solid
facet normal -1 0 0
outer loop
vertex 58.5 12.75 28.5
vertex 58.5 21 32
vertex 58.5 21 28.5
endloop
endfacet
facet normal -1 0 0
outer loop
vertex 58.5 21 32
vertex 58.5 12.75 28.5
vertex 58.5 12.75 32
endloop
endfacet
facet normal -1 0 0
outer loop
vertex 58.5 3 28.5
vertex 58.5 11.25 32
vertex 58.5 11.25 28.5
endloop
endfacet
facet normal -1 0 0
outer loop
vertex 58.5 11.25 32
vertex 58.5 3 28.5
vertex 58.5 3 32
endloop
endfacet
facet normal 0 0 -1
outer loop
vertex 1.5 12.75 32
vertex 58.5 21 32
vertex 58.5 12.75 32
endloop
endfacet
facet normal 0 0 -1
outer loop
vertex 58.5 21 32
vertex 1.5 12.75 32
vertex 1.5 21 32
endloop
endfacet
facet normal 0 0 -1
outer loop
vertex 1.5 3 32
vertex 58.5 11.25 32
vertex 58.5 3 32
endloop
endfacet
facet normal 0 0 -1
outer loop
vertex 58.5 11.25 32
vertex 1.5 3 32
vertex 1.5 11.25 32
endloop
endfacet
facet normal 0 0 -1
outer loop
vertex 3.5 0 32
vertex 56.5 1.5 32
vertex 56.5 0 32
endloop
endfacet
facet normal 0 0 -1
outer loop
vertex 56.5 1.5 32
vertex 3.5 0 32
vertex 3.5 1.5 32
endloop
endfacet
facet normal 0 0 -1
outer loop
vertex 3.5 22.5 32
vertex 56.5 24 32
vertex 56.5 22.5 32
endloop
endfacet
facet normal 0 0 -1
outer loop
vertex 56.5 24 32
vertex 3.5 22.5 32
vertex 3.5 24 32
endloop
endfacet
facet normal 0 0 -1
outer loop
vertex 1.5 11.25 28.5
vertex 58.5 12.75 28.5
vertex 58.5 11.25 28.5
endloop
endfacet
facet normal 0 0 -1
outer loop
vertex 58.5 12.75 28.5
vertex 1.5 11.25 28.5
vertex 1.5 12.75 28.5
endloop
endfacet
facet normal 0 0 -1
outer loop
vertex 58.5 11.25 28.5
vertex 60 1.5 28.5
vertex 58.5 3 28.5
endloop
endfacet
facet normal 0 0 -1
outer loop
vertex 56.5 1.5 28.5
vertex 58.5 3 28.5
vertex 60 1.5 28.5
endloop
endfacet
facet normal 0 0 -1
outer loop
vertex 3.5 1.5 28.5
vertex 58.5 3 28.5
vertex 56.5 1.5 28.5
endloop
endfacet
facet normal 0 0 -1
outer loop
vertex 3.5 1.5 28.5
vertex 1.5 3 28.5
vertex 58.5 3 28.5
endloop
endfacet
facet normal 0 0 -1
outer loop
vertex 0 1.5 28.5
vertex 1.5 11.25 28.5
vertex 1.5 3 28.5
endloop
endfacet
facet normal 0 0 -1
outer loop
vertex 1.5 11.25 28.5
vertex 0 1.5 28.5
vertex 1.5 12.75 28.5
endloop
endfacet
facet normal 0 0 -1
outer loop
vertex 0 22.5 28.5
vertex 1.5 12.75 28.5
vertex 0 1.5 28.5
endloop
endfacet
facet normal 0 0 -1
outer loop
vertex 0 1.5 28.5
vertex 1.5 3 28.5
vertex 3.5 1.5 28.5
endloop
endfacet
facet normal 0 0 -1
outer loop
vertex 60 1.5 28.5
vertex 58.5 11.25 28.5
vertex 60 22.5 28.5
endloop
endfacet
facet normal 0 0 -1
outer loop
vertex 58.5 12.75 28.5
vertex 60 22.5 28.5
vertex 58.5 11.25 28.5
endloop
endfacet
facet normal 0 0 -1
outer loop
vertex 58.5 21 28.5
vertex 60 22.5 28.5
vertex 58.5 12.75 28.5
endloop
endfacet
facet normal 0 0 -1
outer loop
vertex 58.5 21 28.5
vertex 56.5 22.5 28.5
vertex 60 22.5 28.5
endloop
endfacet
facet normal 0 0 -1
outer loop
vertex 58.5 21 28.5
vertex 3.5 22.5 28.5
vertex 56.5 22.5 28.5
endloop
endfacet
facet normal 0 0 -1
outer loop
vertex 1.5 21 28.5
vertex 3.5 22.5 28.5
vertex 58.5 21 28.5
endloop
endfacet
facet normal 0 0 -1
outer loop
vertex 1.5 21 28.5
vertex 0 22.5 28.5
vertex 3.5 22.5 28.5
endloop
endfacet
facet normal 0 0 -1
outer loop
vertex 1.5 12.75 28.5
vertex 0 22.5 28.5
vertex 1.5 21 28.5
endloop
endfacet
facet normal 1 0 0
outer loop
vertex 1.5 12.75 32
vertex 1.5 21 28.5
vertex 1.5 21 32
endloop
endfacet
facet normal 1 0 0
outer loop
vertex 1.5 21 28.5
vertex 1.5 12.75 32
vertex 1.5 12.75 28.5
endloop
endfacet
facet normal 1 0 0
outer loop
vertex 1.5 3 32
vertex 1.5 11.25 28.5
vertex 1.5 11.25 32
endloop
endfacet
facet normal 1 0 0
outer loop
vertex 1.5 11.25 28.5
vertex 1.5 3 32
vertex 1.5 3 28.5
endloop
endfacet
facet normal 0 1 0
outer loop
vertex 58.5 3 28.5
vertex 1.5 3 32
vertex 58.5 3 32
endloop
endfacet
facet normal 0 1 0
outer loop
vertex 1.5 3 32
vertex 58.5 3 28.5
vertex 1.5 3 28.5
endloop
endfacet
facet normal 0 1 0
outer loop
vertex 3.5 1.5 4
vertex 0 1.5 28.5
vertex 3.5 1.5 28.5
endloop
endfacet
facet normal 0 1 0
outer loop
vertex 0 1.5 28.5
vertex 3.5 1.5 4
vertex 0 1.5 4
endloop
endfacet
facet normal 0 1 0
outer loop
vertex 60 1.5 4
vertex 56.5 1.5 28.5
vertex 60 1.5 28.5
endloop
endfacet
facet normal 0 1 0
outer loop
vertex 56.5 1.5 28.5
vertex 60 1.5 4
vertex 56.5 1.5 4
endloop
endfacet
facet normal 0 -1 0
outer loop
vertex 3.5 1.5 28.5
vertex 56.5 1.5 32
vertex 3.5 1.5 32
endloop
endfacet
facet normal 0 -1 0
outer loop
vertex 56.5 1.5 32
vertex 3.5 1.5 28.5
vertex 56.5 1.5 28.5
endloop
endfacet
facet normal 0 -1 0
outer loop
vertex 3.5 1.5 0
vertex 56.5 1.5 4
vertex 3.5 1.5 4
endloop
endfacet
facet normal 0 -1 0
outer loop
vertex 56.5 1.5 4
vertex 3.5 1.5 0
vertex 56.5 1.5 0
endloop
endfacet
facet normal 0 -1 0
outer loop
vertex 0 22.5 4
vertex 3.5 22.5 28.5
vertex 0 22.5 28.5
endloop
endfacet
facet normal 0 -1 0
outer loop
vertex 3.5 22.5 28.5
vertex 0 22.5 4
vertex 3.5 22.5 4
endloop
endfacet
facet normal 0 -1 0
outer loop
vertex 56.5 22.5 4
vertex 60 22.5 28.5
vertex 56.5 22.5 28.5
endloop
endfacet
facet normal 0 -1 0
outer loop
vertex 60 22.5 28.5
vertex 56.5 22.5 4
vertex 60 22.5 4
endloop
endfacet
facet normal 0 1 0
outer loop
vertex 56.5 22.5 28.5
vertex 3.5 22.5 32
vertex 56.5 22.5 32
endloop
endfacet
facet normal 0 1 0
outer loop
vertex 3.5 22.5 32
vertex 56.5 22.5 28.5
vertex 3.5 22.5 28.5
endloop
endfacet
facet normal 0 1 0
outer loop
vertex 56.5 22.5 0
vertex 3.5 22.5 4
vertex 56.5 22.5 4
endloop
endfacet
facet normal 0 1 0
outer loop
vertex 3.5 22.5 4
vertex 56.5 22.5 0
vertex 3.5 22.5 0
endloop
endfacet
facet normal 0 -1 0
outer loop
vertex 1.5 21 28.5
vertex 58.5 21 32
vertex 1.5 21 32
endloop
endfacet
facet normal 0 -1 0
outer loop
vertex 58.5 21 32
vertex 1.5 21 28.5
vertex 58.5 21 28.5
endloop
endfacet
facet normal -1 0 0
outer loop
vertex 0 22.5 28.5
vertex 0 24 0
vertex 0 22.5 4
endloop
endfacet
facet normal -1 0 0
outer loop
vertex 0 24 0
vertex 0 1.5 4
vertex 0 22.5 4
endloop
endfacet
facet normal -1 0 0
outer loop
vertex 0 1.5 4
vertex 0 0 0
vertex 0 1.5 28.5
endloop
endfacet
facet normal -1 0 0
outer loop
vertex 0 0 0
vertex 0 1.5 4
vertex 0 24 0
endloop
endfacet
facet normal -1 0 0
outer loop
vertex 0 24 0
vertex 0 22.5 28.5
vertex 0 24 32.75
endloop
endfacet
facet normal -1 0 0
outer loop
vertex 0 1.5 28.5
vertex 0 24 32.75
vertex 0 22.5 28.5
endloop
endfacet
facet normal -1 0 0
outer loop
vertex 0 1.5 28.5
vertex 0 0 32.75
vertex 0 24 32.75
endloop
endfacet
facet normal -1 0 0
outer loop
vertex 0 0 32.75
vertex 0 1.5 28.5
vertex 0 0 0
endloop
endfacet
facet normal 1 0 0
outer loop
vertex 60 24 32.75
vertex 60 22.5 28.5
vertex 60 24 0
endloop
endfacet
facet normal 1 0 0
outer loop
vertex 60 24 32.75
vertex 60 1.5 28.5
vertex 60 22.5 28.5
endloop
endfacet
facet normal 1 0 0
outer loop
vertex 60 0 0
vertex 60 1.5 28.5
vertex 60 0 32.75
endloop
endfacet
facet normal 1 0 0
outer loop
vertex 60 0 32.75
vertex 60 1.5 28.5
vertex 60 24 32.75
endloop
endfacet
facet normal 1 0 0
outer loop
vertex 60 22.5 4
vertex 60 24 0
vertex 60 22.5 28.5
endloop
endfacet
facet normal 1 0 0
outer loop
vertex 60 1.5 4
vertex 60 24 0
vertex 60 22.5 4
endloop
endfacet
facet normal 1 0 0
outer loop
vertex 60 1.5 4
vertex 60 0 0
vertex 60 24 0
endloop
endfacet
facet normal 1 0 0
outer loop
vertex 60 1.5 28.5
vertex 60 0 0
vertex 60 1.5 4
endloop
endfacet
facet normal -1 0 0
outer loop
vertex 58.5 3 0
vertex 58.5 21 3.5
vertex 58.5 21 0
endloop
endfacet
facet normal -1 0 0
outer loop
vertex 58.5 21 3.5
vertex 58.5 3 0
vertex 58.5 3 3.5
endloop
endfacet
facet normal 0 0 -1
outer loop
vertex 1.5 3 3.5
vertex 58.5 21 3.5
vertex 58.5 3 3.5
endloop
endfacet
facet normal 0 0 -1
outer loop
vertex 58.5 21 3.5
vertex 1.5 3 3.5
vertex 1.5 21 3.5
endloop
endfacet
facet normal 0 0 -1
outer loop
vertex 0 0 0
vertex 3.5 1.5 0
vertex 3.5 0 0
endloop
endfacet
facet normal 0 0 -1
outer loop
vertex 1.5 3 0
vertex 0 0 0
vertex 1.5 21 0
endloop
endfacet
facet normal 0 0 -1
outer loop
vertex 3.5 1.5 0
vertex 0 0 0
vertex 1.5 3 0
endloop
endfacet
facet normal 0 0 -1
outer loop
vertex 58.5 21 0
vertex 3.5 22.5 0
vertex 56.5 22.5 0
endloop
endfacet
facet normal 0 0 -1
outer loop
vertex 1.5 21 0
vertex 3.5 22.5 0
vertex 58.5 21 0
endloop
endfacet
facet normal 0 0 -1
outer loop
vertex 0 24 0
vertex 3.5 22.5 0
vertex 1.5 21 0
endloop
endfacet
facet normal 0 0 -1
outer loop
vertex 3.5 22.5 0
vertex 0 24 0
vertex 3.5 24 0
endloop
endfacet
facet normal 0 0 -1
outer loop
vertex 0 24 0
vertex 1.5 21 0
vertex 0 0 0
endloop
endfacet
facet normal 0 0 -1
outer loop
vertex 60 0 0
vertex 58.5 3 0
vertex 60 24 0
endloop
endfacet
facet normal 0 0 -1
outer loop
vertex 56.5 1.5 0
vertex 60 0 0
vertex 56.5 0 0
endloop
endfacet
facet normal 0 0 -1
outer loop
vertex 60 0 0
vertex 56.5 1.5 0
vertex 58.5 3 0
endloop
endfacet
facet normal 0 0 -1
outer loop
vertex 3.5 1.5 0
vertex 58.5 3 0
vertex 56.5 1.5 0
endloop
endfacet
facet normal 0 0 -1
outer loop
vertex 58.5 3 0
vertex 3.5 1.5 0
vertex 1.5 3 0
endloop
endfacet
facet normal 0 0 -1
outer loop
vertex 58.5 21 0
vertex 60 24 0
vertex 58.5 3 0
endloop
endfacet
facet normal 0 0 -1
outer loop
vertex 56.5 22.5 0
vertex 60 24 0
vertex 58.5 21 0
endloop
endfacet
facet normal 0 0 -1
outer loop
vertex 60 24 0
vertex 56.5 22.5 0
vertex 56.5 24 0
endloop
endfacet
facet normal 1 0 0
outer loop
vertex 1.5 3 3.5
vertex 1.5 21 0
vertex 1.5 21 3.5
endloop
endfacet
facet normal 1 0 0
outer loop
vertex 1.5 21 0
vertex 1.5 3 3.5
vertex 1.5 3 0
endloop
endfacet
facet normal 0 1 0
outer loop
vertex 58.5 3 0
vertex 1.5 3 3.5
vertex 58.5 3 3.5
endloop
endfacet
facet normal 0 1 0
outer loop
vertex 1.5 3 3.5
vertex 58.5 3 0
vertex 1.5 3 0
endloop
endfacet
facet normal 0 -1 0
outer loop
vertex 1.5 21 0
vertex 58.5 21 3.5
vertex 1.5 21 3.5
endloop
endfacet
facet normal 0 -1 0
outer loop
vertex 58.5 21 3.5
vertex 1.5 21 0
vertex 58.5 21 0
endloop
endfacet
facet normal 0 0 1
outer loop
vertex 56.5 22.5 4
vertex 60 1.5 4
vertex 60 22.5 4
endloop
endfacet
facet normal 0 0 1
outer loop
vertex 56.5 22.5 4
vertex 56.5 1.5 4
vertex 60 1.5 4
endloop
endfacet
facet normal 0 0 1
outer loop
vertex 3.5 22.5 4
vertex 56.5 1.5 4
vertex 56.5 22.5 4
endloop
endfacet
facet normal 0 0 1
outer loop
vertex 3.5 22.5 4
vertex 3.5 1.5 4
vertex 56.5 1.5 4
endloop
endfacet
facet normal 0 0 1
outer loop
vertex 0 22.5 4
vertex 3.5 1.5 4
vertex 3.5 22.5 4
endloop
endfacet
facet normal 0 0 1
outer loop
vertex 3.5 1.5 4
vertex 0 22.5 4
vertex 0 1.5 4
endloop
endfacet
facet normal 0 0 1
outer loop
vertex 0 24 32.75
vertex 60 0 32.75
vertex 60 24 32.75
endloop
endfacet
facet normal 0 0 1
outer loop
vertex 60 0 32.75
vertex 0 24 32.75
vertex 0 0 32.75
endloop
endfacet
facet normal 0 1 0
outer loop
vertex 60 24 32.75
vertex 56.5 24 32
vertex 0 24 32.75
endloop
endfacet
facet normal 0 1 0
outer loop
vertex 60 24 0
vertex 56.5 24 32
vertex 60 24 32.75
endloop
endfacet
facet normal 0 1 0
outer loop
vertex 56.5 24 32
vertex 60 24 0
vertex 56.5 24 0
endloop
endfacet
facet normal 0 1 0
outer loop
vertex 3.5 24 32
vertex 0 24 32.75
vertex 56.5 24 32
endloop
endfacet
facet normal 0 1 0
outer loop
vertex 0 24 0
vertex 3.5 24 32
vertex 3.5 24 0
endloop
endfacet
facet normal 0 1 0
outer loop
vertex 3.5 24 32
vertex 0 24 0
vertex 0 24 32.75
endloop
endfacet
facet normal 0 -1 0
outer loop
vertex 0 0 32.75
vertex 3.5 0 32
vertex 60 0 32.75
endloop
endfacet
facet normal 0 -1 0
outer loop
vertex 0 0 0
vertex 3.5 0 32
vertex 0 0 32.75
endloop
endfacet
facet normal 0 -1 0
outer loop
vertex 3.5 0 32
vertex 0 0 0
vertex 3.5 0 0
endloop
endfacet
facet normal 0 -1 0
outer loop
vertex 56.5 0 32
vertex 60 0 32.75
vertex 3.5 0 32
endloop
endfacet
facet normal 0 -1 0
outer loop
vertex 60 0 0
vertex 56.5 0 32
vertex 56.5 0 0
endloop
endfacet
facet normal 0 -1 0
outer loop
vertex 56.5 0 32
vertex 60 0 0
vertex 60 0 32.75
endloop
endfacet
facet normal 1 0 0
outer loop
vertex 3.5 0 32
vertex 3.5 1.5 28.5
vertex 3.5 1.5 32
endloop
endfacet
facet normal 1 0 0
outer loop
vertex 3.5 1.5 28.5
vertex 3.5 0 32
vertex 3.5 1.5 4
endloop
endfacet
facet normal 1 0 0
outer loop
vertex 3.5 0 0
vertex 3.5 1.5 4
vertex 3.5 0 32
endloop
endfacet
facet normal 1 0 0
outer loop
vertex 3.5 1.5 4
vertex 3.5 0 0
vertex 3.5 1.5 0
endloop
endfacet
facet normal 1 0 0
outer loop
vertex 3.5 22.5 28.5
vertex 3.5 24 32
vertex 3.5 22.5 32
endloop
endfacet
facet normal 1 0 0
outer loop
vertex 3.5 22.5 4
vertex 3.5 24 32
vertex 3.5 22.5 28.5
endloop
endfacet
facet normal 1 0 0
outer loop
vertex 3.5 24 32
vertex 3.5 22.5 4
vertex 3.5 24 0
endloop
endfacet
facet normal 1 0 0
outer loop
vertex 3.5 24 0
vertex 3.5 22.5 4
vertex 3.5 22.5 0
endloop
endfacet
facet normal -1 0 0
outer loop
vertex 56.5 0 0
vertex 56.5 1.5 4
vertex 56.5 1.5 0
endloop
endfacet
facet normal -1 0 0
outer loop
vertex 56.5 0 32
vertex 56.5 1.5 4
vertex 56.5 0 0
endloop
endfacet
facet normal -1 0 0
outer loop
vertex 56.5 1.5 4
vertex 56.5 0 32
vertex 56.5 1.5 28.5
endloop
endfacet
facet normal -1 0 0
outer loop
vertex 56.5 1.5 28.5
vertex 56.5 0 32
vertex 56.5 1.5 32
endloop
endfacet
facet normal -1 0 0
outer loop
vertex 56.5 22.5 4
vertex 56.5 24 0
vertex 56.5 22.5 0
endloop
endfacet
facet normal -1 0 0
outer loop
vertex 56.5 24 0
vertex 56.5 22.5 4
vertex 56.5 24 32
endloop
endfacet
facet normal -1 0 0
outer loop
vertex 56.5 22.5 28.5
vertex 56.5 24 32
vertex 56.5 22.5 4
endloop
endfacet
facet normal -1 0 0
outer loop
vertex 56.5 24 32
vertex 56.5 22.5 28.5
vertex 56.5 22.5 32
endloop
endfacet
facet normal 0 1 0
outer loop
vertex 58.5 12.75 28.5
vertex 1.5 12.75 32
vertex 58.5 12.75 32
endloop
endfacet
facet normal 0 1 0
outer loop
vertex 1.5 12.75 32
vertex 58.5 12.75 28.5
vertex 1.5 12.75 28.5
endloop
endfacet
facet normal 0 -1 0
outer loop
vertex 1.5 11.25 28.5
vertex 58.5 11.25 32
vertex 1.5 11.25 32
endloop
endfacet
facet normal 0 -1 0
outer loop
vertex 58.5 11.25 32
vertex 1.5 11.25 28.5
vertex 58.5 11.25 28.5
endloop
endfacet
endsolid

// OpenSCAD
//Draw Allted's Simple CNC Table based on input dimensions using openscad
//Translated into openscad on 4/4/2016  by: David Bunch
//
//The default dimensions are what I am using for a table, 48"Long x 36"Wide x 30"High
//This is drawn in Inches, set ScaleFactor variable to 25.4 to draw in millimeters
//Rev2 - revised for Quantity of Top Ledge Lengths if only 1 middle stiffener used
//Rev3 - Legs, Top Ledges & Shelf Ledges can be different Widths & thickness now
//       I made this change because I want to use 2x3's for the Shelf ledges
//Rev4 - Display Shelf Usable Heights with a visual cube for each shelf
//CUSTOMIZER VARIABLES
//If you want your MPCNC corners to be right at corners of table,
//Set Len & Wid the same as your CNC_LEN & CNC_Wid
Len = 5*12;                   //Length of Table
Wid = 24;            //Width of Table
Caster_Height = 4;           //how tall are your casters
Total_Height = 36;           //Total height of the table (Including casters)
Ht = Total_Height - Caster_Height;                    //Height of Table at top of Ledges
LegWd24_Wid = 3.5;          //Width Legs (I am using 2x4)
LegWd24_Thk = 1.5;          //Thickness of 2Legs

TopLedgeWd24_Wid = 3.5;     //Width of Top Ledge Boards (2x4 is what I use)
TopLedgeWd24_Thk = 1.5;     //Thickness of Top Ledge Boards
MidTopLedgeQty = 1;         //How many middle stiffener ledges, 1 or 2

EdgeWd_Wid = 0;             //How wide of top to put along edges
EdgeWd_Thk = .75;             //How thick the top is

Shelf_Qty = 1;              //0,1 or 2
Shelf1_Ht = 3.5;              //Shelf height of lower shelf
Shelf2_Ht = 20;             //Shelf height of upper shelf
ShelfThk = 0.5;             //Thickness of Shelves
ShelfLedgeWd24_Wid = 3.5;   //Width of Shelf Ledge Boards (Default is 2x4)
ShelfLedgeWd24_Thk = 1.5;   //Thickness of Shelf Ledge Boards
                        //I am going to use 2x3 to give me a little extra shelf height
Shelf_Cube_X = 12;  //Visual Show Shelf Cube this size in X
Shelf_Cube_Y = 12;  //Visual Show Shelf Cube this size in Y
CNC_Len = 36;       //Length of Physical MPCNC (subtract 11 for work Length)
                    //Length is the Y-Axis on my machine
CNC_Wid = 24;       //Width of Physical MPCNC (subtract 11 for work Width)
                    //Width is the X-Axis on my machine
EMT_OD = 23.6 / 25.4;       //Diameter of EMT, convert to Inches
ScaleFactor = 1;    //1 = draw in Inches, set to 25.4 to draw in millimeters
//CUSTOMIZER VARIABLES END

//Calculate Usable Shelf Space Heights
ToeSpace = Shelf1_Ht - ShelfLedgeWd24_Wid;  //Space Below Bottom Shelf Ledge
OneShelfSpace = Ht - TopLedgeWd24_Wid - (Shelf1_Ht + ShelfThk);
BotShelfSpace = Shelf2_Ht - ShelfLedgeWd24_Wid - (Shelf1_Ht + ShelfThk);
TopShelfSpace = Ht - TopLedgeWd24_Wid - (Shelf2_Ht + ShelfThk);

//Your actual work area will probably be less depending on
//what size router you are using & how wide your tool holder is
CNC_WorkLen = CNC_Len - 11;         //Work area Length of MPCNC router
CNC_WorkWid = CNC_Wid - 11;         //Work area Width of MPCNC router
Work_Y_Loc = (Len - CNC_WorkLen)/2; //X & Y locations of work area in this drawing
Work_X_Loc = (Wid - CNC_WorkWid)/2;

TopMidWid = Wid-(EdgeWd_Wid*2);
CNC_Corner_Wid = 53.0 / 25.4;
CNC_Corner_Ht = 63.2 / 25.4;

Len2 = Len / 2;
Wid2 = Wid / 2;
CNC_Len2 = CNC_Len / 2;
CNC_Wid2 = CNC_Wid / 2;
CNC_Corner_Wid2 = CNC_Corner_Wid / 2;

WdTopLedgeLen = Len - (TopLedgeWd24_Thk * 2);
WdTopLedgeWid = Wid - (TopLedgeWd24_Thk * 2);

WdShelfLedgeLen = Len - (ShelfLedgeWd24_Thk * 2);
WdShelfLedgeWid = Wid - (ShelfLedgeWd24_Thk * 2);
ShelfWid = Wid - (LegWd24_Thk * 2);    //Width of each of the 1 or 2 shelf tops

MPCNC_X_Loc = Len2-CNC_Len2;    //MPCNC router X location from Lower Left corner
MPCNC_Y_Loc = Wid2-CNC_Wid2;    //MPCNC router Y location from Lower Left corner
PipeY_Z_Loc = 22.8 / 25.4;  //EMT Y Axis Z Height Location from base of Corner block
PipeX_Z_Loc = 50.4 / 25.4;  //EMT X Axis Z Height Location from base of Corner block

//Output Cut Data
if (ScaleFactor == 1)
{
    Header = "*******************************";
    Spacer = "----------------------------------------------";
    c = str("** Cut 4 Legs ",Ht,"\" Long");
    d1 = str("** Cut 3 Top Ledge Lengths ",WdTopLedgeLen,"\" Long");
    d2 = str("** Cut 4 Top Ledge Lengths ",WdTopLedgeLen,"\" Long");
    e = str("** Cut 2 Top Ledge Widths ",WdTopLedgeWid,"\" Long");
    FTS = str("** Cut 2 Top Edges ",Len,"\" x ",EdgeWd_Wid,"\" Wide");
    FTM = str("** Cut 1 Top Middle ",Len,"\" x ",TopMidWid,"\" Wide");
    FL1 = str("** Cut 2 Shelf Ledge Lengths ",WdTopLedgeLen,"\" Long");
    FW1 = str("** Cut 2 Shelf Ledge Widths ",WdTopLedgeWid,"\" Long");
    FS1 = str("** Cut 1 shelves ",Len,"\" x ",ShelfWid,"\" Wide");
    //ShelfWid
    FL2 = str("** Cut 4 Shelf Ledge Lengths ",WdTopLedgeLen,"\" Long");
    FW2 = str("** Cut 4 Shelf Ledge Widths ",WdTopLedgeWid,"\" Long");
    FS2 = str("** Cut 2 shelves ",Len,"\" x ",ShelfWid,"\" Wide");
    F_ToeSpace = str("** Toe Space Height = ",ToeSpace, chr(34));
    F_UseSpace = str("** Single Shelf Usable Height = ",OneShelfSpace, chr(34));
    F_UseSpace1 = str("** Bottom Shelf Usable Height = ",BotShelfSpace, "\"");
    F_UseSpace2 = str("** Top Shelf Usable Height = ",TopShelfSpace, "\"");   
    echo(Header);
    echo(c);
    if (MidTopLedgeQty == 1)
    {
        echo(d1);
    } else if (MidTopLedgeQty == 2)
    {
        echo(d2);
    }
    echo(e);
    echo(FTS);
    echo(FTM);
    echo(Spacer);
    if (Shelf_Qty == 1)
    {
        echo(FL1);
        echo(FW1);
        echo(FS1);
        echo(Spacer);
        echo(F_ToeSpace);
        echo(F_UseSpace);
//Draw Cube to Represent Toe Space"
//        translate([0,LegWd24_Thk,0])
//        %cube([Shelf_Cube_X,Shelf_Cube_Y,ToeSpace]);
//Draw Cube to Represent Bottom Shelf Height"
//        color("red",.7)
//        translate([0,0,Shelf1_Ht + ShelfThk])
//        %cube([Shelf_Cube_X,Shelf_Cube_Y,OneShelfSpace]);

    } else if (Shelf_Qty == 2)
    {
        echo(FL2);
        echo(FW2);
        echo(FS2);
        echo(Spacer);
        echo(F_ToeSpace);
        echo(F_UseSpace1);
        echo(F_UseSpace2);
//Draw Cube to Represent Toe Space"
//        translate([0,LegWd24_Thk,0])
//        %cube([Shelf_Cube_X,Shelf_Cube_Y,ToeSpace]);
//Draw Cube to Represent Bottom Shelf Height"
//        color("red",.7)
//        translate([0,LegWd24_Thk,Shelf1_Ht + ShelfThk])
//        %cube([Shelf_Cube_X,Shelf_Cube_Y,BotShelfSpace]);
//Draw Cube to Represent Top Shelf Height"
//        color("blue",.7)
//        translate([0,LegWd24_Thk,Shelf2_Ht + ShelfThk])
//        %cube([Shelf_Cube_X,Shelf_Cube_Y,TopShelfSpace]);
    }
    echo(Header);
} else if (ScaleFactor == 25.4)
{
    Header = "**********************************";
    Spacer = "----------------------------------------------------";
    c = str("** Cut 4 Legs ",Ht*25.4,"mm Long");
    d = str("** Cut 4 Top Ledge Lengths ",WdTopLedgeLen*25.4,"mm Long");
    e = str("** Cut 2 Top Ledge Widths ",WdTopLedgeWid*25.4,"mm Long");
    FTS = str("** Cut 2 Top Edges ",Len*25.4,"\" x ",EdgeWd_Wid*25.4,"\" Wide");
    FTM = str("** Cut 1 Top Middle ",Len*25.4,"\" x ",TopMidWid*25.4,"\" Wide");
    FL1 = str("** Cut 2 Shelf Ledge Lengths ",WdTopLedgeLen*25.4,"mm Long");
    FW1 = str("** Cut 2 Shelf Ledge Widths ",WdTopLedgeWid*25.4,"mm Long");
    FS1 = str("** Cut 1 shelves ",Len*25.4,"\" x ",ShelfWid*25.4,"mm Wide");
    //ShelfWid
    FL2 = str("** Cut 4 Shelf Ledge Lengths ",WdTopLedgeLen*25.4,"mm Long");
    FW2 = str("** Cut 4 Shelf Ledge Widths ",WdTopLedgeWid*25.4,"mm Long");
    FS2 = str("** Cut 2 shelves ",Len*25.4,"\" x ",ShelfWid*25.4,"mm Wide");
    
    echo(Header);
    echo(c);
    echo(d);
    echo(e);
    echo(FTS);
    echo(FTM);
    echo(Spacer);
    if (Shelf_Qty == 1)
    {
        echo(FL1);
        echo(FW1);
        echo(FS1);
    } else if (Shelf_Qty == 2)
    {
        echo(FL2);
        echo(FW2);
        echo(FS2);
    }
    echo(Header);
}

module Leg()
{
    cube([LegWd24_Wid,LegWd24_Thk,Ht]);
}
module TopEdge()
{
    color("tan",.7)
    cube([Len,EdgeWd_Wid,EdgeWd_Thk]);  
}
module TopMiddle()
{
    color("Peru",.7)
    cube([Len,Wid-(EdgeWd_Wid*2),EdgeWd_Thk]);
}
module Shelf()
{
    color("Peru",.7)
    cube([Len,ShelfWid,ShelfThk]);
}
module LengthBoard()
{
        cube([WdTopLedgeLen,TopLedgeWd24_Thk,TopLedgeWd24_Wid]);
}


module TopLedges()
{
//Draw The Long Length Ledges (Len)
    color("cyan")
    {
        translate([TopLedgeWd24_Thk,LegWd24_Thk,0])
        LengthBoard();
        //cube([WdTopLedgeLen,TopLedgeWd24_Thk,TopLedgeWd24_Wid]);
        translate([TopLedgeWd24_Thk,Wid-LegWd24_Thk-TopLedgeWd24_Thk,0])
        LengthBoard();
        //cube([WdTopLedgeLen,TopLedgeWd24_Thk,TopLedgeWd24_Wid]);
    }
//Draw the Short Length Ledges (Wid)
    color("green")
    {
        translate([0,LegWd24_Thk,0])
        cube([TopLedgeWd24_Thk,Wid-(LegWd24_Thk*2),TopLedgeWd24_Wid]);
        translate([Len-TopLedgeWd24_Thk,LegWd24_Thk,0])
        cube([TopLedgeWd24_Thk,Wid-(LegWd24_Thk*2),TopLedgeWd24_Wid]);
    }
}
module ShelfLedges()
{
//Draw The Long Length Ledges (Len)
    color("cyan")
    {
        translate([ShelfLedgeWd24_Thk,LegWd24_Thk,0])
        cube([WdShelfLedgeLen,ShelfLedgeWd24_Thk,ShelfLedgeWd24_Wid]);
        translate([ShelfLedgeWd24_Thk,Wid-LegWd24_Thk-ShelfLedgeWd24_Thk,0])
        cube([WdShelfLedgeLen,ShelfLedgeWd24_Thk,ShelfLedgeWd24_Wid]);
    }
//Draw the Short Length Ledges (Wid)
    color("green")
    {
        translate([0,LegWd24_Thk,0])
        cube([ShelfLedgeWd24_Thk,Wid-(LegWd24_Thk*2),ShelfLedgeWd24_Wid]);
        translate([Len-ShelfLedgeWd24_Thk,LegWd24_Thk,0])
        cube([ShelfLedgeWd24_Thk,Wid-(LegWd24_Thk*2),ShelfLedgeWd24_Wid]);
    }
}


scale([ScaleFactor,ScaleFactor,ScaleFactor])
{
    translate([0,0,Ht])
    #TopEdge();         //Draw the 1st Top Edge
    translate([0,Wid-EdgeWd_Wid,Ht])
    #TopEdge();         //Draw the 2nd Top Edge
    translate([0,EdgeWd_Wid,Ht])
    #TopMiddle();       //Draw the Top Middle
    
    
    //Draw Legs
    Leg();              //Draw 1st Leg
    translate([0,Wid-LegWd24_Thk,0])
    Leg();              //Draw 2nd Leg
    translate([Len-LegWd24_Wid,0,0])
    Leg();              //Draw 3rd Leg
    translate([Len-LegWd24_Wid,Wid-LegWd24_Thk,0])
    Leg();              //Draw 4th Leg
    translate([0,0,Ht-TopLedgeWd24_Wid])
    
    
    TopLedges();           //Draw the 4 top outside ledges that top rests on
    
    
    if (MidTopLedgeQty == 1)
    {
        translate([TopLedgeWd24_Thk,Wid/2-(LegWd24_Thk/2) ,Ht-TopLedgeWd24_Wid])
        cube([WdTopLedgeLen,TopLedgeWd24_Thk,TopLedgeWd24_Wid]);
    } else
    {
        translate([TopLedgeWd24_Thk,(Wid/2-(LegWd24_Thk/2))+6,Ht-TopLedgeWd24_Wid])
        cube([WdTopLedgeLen,TopLedgeWd24_Thk,TopLedgeWd24_Wid]);
        translate([TopLedgeWd24_Thk,(Wid/2-(LegWd24_Thk/2))-6,Ht-TopLedgeWd24_Wid])
        cube([WdTopLedgeLen,TopLedgeWd24_Thk,TopLedgeWd24_Wid]);
    }
    if (Shelf_Qty > 0)
    {
        translate([0,0,Shelf1_Ht-ShelfLedgeWd24_Wid])
        ShelfLedges();
        translate([0,LegWd24_Thk,Shelf1_Ht])
        Shelf();
    }
    if (Shelf_Qty > 1)
    {
        translate([0,0,Shelf2_Ht-ShelfLedgeWd24_Wid])
        ShelfLedges();
        translate([0,LegWd24_Thk,Shelf2_Ht])
        Shelf();
    }
}
